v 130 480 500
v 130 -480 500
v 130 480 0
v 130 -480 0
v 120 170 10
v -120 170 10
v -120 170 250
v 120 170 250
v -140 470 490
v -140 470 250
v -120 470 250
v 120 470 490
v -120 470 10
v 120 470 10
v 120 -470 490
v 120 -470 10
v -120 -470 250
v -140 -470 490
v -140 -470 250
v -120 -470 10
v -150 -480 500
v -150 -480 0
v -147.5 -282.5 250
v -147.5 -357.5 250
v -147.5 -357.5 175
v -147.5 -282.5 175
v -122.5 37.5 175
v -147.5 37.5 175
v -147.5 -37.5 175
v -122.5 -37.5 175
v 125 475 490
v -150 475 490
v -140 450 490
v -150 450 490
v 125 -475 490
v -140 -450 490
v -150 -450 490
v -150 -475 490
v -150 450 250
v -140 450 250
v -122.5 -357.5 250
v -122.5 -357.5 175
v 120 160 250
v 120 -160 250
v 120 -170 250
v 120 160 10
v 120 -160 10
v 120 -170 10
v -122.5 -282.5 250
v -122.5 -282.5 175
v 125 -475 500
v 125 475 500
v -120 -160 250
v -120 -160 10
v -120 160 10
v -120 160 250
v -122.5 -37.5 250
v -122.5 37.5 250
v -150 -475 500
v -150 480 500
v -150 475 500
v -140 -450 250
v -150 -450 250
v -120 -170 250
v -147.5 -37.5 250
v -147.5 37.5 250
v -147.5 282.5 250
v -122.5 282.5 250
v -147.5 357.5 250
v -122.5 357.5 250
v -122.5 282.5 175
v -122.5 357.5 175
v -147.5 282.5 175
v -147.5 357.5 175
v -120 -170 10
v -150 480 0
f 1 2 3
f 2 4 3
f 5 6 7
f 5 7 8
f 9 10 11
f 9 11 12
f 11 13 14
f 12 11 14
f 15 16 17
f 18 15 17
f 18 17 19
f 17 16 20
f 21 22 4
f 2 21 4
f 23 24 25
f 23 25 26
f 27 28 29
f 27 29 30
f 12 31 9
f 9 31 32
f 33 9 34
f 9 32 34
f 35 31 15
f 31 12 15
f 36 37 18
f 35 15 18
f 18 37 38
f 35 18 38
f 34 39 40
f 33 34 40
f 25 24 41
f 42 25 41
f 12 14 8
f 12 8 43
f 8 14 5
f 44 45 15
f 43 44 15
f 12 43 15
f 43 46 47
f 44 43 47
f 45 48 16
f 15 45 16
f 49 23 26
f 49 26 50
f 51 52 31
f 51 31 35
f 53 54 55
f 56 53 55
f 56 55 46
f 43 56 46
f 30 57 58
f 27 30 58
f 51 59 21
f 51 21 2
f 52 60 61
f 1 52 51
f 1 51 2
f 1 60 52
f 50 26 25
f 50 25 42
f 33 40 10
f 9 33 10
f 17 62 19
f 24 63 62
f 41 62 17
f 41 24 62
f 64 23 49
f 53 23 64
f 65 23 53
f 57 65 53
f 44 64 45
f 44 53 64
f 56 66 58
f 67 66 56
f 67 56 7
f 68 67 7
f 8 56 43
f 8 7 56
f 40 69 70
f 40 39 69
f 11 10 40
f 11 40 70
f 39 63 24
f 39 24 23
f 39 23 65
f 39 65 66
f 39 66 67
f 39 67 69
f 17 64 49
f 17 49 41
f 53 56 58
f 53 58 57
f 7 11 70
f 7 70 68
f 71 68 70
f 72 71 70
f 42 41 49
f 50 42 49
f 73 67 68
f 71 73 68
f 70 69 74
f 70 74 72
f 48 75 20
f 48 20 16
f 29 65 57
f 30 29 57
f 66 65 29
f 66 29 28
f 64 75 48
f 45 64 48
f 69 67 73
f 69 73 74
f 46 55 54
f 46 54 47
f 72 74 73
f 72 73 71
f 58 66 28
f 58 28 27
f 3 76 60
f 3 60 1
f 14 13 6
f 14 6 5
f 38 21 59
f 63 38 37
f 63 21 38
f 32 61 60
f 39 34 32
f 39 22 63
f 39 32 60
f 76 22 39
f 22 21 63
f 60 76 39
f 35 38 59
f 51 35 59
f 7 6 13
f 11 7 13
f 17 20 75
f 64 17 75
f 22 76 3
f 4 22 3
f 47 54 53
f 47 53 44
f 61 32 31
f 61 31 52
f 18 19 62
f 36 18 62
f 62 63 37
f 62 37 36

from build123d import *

# Parameters (mm, degrees)
F0_W      = 260
F0_H      = 960
F1_DEPTH  = 250
F2_T      = -10
F3_W      = 240
F3_H      = 10
F4_DEPTH  = 240
F5_W      = 10
F5_H      = 20
F5_H_2    = 10
F5_H_3    = 920
F6_DEPTH  = 250
F0_W_2    = 20
F7_DEPTH  = 250
F8_W      = 25
F8_H      = 75
F9_DEPTH  = 75
F10_W     = 25
F10_H     = 10
F10_W_2   = 900
F11_DEPTH = 275


with BuildPart() as f1:
    # F0 (on Top) → F1 (new body)
    with BuildSketch(Plane.XY):
        Rectangle(F0_W, F0_H)
    extrude(amount=F1_DEPTH)

    # F2
    f2_openings = [f1.faces().sort_by_distance(p)[0] for p in [
        (0, 0, 250),
    ]]
    offset(amount=F2_T, openings=f2_openings)

    # F3 (on face) → F4 (join)
    with BuildSketch(Plane.XY.offset(10)):
        with Locations((0, -165)):
            Rectangle(F3_W, F3_H)
        with Locations((0, 165)):
            Rectangle(F3_W, F3_H)
    extrude(amount=F4_DEPTH)

    # F5 (on face) → F6 (join)
    with BuildSketch(Plane.XY.offset(250)):
        with Locations((-145, -460)):
            Rectangle(F5_W, F5_H)
        Polygon((-150, -480), (120, -480), (120, -470), (-120, -470), (-140, -470), (-150, -470), align=None)
        with Locations((125, -475)):
            Rectangle(F5_W, F5_H_2)
        with Locations((125, -465)):
            Rectangle(F5_W, F5_H_2)
        with Locations((125, 0)):
            Rectangle(F5_W, F5_H_3)
        with Locations((125, 465)):
            Rectangle(F5_W, F5_H_2)
        with Locations((125, 475)):
            Rectangle(F5_W, F5_H_2)
        Polygon((-120, 470), (120, 470), (120, 480), (-150, 480), (-150, 470), (-140, 470), align=None)
        with Locations((-145, 460)):
            Rectangle(F5_W, F5_H)
    extrude(amount=F6_DEPTH)

    # F0 (on Top) → F7 (join)
    with BuildSketch(Plane.XY):
        with Locations((-140, 0)):
            Rectangle(F0_W_2, F0_H)
    extrude(amount=F7_DEPTH)

    # F8 (on face) → F9 (cut)
    with BuildSketch(Plane.XY.offset(250)):
        with Locations((-135, 320)):
            Rectangle(F8_W, F8_H)
        with Locations((-135, 0)):
            Rectangle(F8_W, F8_H)
        with Locations((-135, -320)):
            Rectangle(F8_W, F8_H)
    extrude(amount=-F9_DEPTH, mode=Mode.SUBTRACT)

    # F10 (on face) → F11 (cut)
    with BuildSketch(Plane(origin=(-150, 0, 0), x_dir=(0, -1, 0), z_dir=(-1, 0, 0))):
        with Locations((462.5, 495)):
            Rectangle(F10_W, F10_H)
        with Locations((-462.5, 495)):
            Rectangle(F10_W, F10_H)
        with Locations((0, 495)):
            Rectangle(F10_W_2, F10_H)
    extrude(amount=-F11_DEPTH, mode=Mode.SUBTRACT)


solid = f1.part
